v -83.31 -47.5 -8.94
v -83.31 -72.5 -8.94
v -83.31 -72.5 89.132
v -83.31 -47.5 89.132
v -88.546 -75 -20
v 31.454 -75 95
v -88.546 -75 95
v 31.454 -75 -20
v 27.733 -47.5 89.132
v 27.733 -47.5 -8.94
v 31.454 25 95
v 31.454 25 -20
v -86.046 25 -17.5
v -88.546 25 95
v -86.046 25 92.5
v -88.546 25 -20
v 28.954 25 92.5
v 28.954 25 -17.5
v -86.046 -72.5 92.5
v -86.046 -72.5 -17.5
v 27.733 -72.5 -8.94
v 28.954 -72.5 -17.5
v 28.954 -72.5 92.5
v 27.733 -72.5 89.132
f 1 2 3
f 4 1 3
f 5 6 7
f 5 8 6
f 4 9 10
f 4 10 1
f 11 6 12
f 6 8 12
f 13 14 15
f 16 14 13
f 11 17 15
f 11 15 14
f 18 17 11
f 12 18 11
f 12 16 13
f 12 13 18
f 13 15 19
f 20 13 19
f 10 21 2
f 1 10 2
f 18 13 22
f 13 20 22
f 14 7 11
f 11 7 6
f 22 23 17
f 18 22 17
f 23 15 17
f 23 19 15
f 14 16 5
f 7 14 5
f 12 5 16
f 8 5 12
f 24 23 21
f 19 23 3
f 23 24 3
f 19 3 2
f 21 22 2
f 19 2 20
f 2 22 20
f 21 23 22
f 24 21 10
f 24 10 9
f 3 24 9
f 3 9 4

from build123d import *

# Parameters (mm, degrees)
F0_W      = 70
F0_H      = 40
F1_DEPTH  = 25
F2_DEPTH  = 25
F3_DEPTH  = 25
F4_DEPTH  = 25
F5_DEPTH  = 25
F6_DEPTH  = 25
F7_DEPTH  = 25
F8_DEPTH  = 25
F9_DEPTH  = 25
F10_T     = -2.5
F11_W     = 111.0436096787
F11_H     = 98.0712249875
F12_DEPTH = 25


with BuildPart() as f1:
    # F0 (on Front) → F1 (new body)
    with BuildSketch(Plane.XZ):
        with Locations((-3.5461261868, 0)):
            Rectangle(F0_W, F0_H)
    extrude(amount=F1_DEPTH)

    # F2 (add): a face of the model
    f2_faces = [f1.faces().sort_by_distance(p)[0] for p in [
        (-38.5461261868, -12.5, 0),
    ]]
    extrude(f2_faces, amount=F2_DEPTH)

    # F3 (add): a face of the model
    f3_faces = [f1.faces().sort_by_distance(p)[0] for p in [
        (-63.5461261868, -12.5, 0),
    ]]
    extrude(f3_faces, amount=F3_DEPTH)

    # F4 (add): a face of the model
    f4_faces = [f1.faces().sort_by_distance(p)[0] for p in [
        (-28.5461261868, -12.5, 20),
    ]]
    extrude(f4_faces, amount=F4_DEPTH)

    # F5 (add): a face of the model
    f5_faces = [f1.faces().sort_by_distance(p)[0] for p in [
        (-28.5461261868, -12.5, 45),
    ]]
    extrude(f5_faces, amount=F5_DEPTH)

    # F6 (add): a face of the model
    f6_faces = [f1.faces().sort_by_distance(p)[0] for p in [
        (-28.5461261868, -25, 25),
    ]]
    extrude(f6_faces, amount=F6_DEPTH)

    # F7 (add): a face of the model
    f7_faces = [f1.faces().sort_by_distance(p)[0] for p in [
        (-28.5461261868, -50, 25),
    ]]
    extrude(f7_faces, amount=F7_DEPTH)

    # F8 (add): a face of the model
    f8_faces = [f1.faces().sort_by_distance(p)[0] for p in [
        (-28.5461261868, 0, 25),
    ]]
    extrude(f8_faces, amount=F8_DEPTH)

    # F9 (add): a face of the model
    f9_faces = [f1.faces().sort_by_distance(p)[0] for p in [
        (-28.5461261868, -25, 70),
    ]]
    extrude(f9_faces, amount=F9_DEPTH)

    # F10
    f10_openings = [f1.faces().sort_by_distance(p)[0] for p in [
        (-28.546126, 25, 37.5),
    ]]
    offset(amount=F10_T, openings=f10_openings)

    # F11 (on face) → F12 (join)
    with BuildSketch(Plane(origin=(0, -72.5, 0), x_dir=(-1, 0, 0), z_dir=(0, 1, 0))):
        with Locations((27.7883224189, 40.0959290564)):
            Rectangle(F11_W, F11_H)
    extrude(amount=F12_DEPTH)


solid = f1.part
